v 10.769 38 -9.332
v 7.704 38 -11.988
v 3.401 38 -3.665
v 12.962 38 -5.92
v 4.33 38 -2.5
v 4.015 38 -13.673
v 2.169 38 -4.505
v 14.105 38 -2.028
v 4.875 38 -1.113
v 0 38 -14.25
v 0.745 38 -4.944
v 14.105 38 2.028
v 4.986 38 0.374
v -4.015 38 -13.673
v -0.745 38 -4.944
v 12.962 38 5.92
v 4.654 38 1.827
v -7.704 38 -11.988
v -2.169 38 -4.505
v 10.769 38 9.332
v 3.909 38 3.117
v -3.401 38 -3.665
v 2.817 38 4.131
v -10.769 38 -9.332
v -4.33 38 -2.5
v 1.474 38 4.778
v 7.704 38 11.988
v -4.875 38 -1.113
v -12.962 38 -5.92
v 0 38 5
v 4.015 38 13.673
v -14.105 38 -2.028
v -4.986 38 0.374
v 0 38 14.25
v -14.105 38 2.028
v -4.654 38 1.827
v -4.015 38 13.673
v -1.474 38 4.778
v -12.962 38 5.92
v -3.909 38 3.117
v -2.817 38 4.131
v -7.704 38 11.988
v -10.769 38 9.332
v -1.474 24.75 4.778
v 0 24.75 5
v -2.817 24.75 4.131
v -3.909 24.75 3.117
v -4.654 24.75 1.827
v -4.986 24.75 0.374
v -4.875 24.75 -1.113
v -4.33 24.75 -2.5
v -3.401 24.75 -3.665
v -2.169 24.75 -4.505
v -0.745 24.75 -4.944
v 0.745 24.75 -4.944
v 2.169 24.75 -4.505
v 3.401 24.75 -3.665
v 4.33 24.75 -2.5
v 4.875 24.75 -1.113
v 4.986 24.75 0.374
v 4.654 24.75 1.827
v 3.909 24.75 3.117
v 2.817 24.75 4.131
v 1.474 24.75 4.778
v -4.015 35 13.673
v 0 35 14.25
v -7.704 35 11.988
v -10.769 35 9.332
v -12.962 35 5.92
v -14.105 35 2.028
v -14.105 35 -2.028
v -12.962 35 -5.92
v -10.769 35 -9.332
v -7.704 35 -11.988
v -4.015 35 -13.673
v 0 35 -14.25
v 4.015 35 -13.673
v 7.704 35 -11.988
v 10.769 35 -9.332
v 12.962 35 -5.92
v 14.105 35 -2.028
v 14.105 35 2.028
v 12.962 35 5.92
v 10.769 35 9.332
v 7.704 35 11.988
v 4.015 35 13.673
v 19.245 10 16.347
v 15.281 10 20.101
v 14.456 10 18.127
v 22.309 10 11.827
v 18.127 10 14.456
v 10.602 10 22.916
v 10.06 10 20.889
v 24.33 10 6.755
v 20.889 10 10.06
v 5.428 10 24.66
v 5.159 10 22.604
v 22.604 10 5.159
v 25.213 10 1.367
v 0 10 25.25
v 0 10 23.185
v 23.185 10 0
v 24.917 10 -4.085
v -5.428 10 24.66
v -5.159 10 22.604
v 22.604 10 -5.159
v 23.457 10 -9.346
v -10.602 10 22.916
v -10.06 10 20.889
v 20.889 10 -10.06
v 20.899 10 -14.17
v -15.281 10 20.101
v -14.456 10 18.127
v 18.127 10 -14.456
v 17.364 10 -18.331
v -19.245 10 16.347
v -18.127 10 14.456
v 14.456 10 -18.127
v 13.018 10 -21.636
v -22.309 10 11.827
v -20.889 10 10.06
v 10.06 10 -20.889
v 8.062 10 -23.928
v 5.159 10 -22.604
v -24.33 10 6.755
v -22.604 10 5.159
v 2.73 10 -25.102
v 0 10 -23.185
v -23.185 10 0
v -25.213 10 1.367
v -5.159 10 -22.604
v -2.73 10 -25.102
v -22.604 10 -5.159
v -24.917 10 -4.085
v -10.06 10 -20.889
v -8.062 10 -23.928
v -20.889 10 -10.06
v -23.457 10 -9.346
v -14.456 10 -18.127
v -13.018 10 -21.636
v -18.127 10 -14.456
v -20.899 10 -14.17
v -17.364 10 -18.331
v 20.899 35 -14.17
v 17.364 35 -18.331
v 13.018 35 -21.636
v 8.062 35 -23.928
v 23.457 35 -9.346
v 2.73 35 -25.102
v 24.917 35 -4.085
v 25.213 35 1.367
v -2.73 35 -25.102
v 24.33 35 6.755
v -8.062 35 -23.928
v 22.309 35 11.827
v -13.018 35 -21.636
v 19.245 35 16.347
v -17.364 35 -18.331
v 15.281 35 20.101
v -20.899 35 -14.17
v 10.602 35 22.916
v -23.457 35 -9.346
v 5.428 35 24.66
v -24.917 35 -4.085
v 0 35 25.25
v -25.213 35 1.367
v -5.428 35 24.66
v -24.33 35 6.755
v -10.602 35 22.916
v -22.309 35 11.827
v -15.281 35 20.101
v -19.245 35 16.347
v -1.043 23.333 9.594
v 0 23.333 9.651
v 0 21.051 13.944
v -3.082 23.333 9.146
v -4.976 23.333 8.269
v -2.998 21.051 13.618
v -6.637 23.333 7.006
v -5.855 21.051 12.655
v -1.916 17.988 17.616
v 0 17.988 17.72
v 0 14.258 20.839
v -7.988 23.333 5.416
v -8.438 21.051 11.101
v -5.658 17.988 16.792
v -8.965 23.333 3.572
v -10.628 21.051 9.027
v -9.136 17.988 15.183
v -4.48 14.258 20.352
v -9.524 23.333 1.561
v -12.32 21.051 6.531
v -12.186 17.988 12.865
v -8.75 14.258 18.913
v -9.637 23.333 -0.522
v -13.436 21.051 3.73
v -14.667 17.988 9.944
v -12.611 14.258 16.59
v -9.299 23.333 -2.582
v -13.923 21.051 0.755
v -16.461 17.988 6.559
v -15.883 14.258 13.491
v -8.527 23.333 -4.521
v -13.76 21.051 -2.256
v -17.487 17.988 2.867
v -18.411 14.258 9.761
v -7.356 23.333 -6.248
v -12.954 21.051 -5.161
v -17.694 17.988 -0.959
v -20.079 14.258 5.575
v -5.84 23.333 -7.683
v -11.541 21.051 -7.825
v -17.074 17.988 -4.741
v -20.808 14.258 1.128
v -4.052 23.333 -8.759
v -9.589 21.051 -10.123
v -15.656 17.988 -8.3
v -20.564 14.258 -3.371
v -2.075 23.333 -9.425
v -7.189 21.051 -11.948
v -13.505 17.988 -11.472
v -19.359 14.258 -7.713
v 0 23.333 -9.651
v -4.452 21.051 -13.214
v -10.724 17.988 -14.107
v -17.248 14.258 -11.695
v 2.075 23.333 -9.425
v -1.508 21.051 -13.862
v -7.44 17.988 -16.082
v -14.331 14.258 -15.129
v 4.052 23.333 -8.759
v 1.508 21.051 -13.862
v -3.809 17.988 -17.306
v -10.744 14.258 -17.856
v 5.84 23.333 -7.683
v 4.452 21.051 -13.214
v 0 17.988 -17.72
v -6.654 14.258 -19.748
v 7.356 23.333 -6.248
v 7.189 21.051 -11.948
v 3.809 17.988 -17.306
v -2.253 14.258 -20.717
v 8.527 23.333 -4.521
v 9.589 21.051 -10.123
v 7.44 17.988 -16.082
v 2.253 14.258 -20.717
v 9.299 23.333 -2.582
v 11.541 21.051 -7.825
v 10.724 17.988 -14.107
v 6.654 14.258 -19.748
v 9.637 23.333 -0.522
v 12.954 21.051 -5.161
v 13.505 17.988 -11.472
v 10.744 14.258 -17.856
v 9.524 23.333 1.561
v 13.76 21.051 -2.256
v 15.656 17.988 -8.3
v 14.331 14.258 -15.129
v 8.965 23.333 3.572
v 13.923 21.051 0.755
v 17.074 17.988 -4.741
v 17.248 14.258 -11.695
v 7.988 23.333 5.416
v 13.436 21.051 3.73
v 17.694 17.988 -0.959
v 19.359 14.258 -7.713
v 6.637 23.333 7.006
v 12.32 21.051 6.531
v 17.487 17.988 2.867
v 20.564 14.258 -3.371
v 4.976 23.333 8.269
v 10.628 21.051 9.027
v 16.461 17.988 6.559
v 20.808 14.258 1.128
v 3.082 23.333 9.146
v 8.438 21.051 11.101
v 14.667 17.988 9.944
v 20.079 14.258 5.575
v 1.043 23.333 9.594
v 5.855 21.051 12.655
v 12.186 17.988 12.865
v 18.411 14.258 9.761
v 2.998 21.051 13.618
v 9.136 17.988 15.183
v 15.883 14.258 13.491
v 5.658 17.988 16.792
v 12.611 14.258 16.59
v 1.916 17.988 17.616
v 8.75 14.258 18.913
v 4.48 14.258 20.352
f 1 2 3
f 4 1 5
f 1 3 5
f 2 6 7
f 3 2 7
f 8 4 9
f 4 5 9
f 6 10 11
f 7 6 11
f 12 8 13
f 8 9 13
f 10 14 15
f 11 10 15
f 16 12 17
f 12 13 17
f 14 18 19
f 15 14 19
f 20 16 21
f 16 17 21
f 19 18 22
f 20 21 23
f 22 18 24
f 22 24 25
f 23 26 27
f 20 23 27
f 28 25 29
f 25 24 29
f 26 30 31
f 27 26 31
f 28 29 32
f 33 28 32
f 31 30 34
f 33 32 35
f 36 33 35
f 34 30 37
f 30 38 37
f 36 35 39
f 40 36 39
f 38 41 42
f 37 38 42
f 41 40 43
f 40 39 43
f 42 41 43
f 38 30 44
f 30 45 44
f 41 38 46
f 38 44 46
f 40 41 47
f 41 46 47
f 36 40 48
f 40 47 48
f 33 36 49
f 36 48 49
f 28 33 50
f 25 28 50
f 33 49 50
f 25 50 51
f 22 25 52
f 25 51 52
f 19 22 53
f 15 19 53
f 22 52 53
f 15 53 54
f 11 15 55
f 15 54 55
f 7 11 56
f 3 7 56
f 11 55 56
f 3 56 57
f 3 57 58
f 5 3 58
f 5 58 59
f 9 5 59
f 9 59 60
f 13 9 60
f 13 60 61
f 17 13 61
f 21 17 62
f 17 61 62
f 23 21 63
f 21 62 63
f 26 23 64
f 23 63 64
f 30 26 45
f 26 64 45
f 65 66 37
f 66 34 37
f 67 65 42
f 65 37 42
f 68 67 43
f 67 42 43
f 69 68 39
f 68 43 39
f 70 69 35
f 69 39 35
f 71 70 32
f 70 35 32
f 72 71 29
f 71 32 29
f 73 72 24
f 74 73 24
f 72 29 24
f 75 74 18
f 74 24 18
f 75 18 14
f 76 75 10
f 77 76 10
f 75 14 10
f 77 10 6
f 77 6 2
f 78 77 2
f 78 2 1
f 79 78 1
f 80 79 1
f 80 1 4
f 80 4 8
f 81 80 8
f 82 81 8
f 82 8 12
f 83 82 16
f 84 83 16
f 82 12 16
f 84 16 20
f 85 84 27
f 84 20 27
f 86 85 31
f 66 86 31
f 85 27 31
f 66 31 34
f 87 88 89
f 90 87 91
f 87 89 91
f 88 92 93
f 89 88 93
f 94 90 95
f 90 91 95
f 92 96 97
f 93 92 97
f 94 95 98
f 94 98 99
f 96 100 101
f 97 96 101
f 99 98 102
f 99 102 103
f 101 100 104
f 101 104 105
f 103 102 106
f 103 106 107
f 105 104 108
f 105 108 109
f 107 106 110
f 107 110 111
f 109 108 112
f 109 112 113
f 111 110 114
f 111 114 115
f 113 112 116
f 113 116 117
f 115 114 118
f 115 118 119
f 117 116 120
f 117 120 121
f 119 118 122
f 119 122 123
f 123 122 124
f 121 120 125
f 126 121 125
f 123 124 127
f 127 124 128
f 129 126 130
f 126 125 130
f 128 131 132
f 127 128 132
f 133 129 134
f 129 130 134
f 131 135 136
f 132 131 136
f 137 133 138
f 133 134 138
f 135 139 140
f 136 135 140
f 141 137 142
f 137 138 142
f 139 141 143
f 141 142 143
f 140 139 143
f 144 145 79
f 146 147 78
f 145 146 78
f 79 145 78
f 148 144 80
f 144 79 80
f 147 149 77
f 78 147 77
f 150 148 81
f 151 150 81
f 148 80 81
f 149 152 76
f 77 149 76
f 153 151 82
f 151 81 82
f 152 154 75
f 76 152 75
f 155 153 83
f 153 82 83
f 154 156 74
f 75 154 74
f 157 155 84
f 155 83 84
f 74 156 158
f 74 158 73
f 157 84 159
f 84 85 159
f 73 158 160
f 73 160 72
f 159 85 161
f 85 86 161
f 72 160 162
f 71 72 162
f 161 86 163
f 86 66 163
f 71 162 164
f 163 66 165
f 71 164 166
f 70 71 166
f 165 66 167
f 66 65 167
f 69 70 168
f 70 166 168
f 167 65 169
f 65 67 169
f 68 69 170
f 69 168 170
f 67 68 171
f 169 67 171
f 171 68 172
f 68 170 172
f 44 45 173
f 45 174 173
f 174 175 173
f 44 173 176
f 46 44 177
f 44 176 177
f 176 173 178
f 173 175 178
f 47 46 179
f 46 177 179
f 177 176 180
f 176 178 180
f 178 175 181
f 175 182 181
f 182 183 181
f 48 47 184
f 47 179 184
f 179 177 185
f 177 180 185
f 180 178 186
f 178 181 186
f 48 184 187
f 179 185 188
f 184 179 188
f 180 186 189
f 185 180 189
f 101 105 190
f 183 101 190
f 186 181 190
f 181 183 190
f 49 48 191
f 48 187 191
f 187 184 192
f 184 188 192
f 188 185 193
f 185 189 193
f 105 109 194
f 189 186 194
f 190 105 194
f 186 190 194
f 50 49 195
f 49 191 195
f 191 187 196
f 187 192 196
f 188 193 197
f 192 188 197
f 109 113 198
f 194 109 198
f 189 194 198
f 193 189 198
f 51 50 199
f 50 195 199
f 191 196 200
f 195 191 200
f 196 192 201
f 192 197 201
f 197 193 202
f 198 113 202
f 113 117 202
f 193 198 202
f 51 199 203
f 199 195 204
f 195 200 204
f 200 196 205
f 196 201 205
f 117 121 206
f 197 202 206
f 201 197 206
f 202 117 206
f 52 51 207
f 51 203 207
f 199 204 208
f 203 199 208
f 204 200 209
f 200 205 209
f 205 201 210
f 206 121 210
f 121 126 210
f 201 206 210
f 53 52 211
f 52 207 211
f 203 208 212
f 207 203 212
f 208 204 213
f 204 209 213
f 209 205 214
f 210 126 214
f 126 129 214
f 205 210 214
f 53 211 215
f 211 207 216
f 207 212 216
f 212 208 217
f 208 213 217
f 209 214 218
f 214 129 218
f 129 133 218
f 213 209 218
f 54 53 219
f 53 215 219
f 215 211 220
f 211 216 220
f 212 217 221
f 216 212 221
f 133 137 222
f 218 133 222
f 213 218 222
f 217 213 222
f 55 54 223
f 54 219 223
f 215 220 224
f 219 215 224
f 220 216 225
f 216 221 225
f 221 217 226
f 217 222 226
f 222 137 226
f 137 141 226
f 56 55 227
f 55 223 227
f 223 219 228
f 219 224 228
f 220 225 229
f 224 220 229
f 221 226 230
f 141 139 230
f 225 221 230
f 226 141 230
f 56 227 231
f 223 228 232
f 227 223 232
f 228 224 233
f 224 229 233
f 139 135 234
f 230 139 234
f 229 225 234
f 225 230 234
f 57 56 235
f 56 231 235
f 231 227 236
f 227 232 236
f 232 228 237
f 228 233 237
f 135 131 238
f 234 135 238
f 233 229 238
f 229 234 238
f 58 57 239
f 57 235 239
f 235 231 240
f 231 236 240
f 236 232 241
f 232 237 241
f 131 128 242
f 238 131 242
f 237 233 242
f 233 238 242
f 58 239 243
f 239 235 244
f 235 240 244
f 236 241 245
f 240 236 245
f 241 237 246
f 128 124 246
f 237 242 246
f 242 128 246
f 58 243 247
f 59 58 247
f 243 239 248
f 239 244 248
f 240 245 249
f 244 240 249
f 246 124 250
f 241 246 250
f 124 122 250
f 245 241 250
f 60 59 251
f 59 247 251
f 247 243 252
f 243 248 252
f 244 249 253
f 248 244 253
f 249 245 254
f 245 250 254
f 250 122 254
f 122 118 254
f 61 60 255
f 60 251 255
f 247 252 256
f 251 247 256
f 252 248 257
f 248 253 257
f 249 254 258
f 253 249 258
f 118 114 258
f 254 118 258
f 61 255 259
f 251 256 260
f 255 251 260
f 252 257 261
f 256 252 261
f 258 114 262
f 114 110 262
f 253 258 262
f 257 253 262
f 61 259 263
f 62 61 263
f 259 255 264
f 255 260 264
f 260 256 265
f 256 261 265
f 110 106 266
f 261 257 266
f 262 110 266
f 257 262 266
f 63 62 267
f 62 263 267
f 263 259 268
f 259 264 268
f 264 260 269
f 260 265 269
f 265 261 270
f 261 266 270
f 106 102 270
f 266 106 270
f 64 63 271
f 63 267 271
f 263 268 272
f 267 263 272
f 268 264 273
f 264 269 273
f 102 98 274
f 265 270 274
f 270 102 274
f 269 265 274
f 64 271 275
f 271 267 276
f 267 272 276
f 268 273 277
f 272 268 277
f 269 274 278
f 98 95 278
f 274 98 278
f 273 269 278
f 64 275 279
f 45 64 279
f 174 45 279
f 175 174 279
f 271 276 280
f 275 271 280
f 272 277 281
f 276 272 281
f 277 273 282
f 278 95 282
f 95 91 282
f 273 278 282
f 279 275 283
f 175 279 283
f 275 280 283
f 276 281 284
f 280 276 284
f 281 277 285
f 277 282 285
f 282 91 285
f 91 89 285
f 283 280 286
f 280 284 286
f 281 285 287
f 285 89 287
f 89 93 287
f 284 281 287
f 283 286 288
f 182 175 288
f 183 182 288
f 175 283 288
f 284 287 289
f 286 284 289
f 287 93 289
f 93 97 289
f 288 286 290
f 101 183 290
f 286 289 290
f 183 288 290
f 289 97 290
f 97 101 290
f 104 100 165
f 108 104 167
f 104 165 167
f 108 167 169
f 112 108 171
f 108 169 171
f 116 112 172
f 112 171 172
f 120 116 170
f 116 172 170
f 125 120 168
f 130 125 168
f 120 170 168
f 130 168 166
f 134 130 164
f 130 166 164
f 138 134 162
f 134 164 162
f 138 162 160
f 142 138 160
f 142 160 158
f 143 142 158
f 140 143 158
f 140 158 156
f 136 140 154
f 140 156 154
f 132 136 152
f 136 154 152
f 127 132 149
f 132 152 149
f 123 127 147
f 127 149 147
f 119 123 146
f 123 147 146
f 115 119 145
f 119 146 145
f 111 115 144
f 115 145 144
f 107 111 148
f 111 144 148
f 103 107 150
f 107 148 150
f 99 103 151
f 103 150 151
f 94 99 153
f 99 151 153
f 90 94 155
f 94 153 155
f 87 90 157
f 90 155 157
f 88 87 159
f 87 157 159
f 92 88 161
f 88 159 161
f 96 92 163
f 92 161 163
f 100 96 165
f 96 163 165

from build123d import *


with BuildPart() as part:
    # Sketch1 → Revolve1 (revolve)
    with BuildSketch(Plane.XY, mode=Mode.PRIVATE) as revolve1_sk:
        with BuildLine():
            Line((-23.185394109, 10), (-25.25, 10))
            Line((-25.25, 10), (-25.25, 35))
            Line((-25.25, 35), (-14.25, 35))
            Line((-14.25, 35), (-14.25, 38))
            Line((-14.25, 38), (-5, 38))
            Line((-5, 38), (-5, 24.75))
            ThreePointArc((-5, 24.75), (-15.905808224, 19.610399403), (-23.185394109, 10))
        make_face()
    revolve(revolve1_sk.sketch.rotate(Axis((0, 108.106230536, 0), (0, -1, 0)), 270), axis=Axis((0, 108.106230536, 0), (0, -1, 0)))


solid = part.part
